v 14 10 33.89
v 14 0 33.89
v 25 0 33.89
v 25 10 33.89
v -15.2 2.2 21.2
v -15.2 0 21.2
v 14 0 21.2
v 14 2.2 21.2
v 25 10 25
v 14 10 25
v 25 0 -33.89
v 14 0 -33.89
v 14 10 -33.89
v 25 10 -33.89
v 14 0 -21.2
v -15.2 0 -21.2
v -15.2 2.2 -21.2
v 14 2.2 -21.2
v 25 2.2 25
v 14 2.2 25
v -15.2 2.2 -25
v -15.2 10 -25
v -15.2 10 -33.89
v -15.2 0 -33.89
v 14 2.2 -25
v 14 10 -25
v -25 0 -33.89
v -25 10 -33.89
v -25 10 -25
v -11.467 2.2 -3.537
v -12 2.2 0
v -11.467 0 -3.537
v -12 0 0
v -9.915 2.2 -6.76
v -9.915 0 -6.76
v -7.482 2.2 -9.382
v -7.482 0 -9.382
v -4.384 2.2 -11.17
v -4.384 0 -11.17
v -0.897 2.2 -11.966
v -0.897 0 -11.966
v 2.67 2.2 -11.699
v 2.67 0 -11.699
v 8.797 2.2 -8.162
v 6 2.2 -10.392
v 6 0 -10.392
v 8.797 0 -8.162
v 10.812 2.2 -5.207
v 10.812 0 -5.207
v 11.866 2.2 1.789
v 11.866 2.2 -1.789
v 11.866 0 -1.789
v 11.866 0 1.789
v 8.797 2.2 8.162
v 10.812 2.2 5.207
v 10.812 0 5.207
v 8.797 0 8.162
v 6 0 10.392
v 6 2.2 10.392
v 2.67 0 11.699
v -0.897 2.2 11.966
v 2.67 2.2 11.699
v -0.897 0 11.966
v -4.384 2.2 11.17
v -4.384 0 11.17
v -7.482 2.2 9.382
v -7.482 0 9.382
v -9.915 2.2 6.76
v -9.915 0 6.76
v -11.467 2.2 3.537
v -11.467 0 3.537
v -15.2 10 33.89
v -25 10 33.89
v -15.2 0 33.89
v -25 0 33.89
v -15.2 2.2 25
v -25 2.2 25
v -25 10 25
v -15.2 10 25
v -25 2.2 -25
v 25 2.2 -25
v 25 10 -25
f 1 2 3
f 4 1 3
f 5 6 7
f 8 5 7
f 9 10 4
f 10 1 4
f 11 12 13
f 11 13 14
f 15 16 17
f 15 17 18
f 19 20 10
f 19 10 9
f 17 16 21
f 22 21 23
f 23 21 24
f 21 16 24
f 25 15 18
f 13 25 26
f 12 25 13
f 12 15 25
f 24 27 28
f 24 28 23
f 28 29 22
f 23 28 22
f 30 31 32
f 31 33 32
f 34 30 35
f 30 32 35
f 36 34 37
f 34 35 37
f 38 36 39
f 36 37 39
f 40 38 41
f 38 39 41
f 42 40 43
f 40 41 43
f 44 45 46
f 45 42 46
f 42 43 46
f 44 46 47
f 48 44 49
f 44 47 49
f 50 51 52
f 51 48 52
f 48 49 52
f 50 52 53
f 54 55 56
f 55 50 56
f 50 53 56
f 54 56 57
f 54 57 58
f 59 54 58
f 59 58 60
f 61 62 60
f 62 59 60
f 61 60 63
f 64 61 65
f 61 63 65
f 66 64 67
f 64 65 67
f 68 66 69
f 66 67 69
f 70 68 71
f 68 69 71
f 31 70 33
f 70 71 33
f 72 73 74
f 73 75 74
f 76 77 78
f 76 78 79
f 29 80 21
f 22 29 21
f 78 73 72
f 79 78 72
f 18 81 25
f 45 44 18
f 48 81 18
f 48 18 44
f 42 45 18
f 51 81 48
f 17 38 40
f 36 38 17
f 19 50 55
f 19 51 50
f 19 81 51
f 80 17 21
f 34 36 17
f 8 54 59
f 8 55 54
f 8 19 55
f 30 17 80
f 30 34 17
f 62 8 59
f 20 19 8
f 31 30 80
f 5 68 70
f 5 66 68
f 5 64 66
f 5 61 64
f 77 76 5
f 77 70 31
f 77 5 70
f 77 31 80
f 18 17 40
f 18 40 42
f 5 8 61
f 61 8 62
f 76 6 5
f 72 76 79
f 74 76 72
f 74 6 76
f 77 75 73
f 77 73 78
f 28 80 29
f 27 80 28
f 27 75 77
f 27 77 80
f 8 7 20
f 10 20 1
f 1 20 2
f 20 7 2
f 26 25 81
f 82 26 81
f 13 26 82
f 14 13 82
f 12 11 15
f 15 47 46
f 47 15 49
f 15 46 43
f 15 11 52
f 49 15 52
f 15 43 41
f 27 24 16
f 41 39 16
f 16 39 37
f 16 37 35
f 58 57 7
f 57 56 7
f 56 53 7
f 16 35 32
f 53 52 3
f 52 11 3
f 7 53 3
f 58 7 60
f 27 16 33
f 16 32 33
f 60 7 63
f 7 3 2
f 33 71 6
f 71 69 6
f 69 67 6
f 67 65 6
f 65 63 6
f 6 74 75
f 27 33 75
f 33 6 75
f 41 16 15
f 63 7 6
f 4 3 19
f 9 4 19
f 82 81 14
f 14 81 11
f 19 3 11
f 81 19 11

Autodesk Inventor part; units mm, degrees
ref_plane "YZ Plane" through (0, 0, 0) normal (1, 0, 0) x (0, 1, 0)
ref_plane "XZ Plane" through (0, 0, 0) normal (0, 1, 0) x (-1, 0, 0)
ref_plane "XY Plane" through (0, 0, 0) normal (0, 0, 1) x (1, 0, 0)
sketch "Sketch1" plane through (0, 0, 0) normal (0, 1, 0) x (-1, 0, 0)
  circle A0 centre (0, 0) radius 12
  line L0 (25, -21.2) -> (-25, -21.2)
  line L1 (25, -21.2) -> (25, 21.2)
  line L2 (25, 21.2) -> (-25, 21.2)
  line L3 (-25, 21.2) -> (-25, -21.2)
  line L4 (25, 21.2) -> (25, 25)
  line L5 (15.2, 21.2) -> (15.2, 25)
  line L6 (25, -21.2) -> (25, -25)
  line L7 (15.2, -21.2) -> (15.2, -25)
  line L8 (25, -25) -> (15.2, -25)
  line L9 (25, 25) -> (15.2, 25)
  line L10 (-25, 21.2) -> (-25, 25)
  line L11 (-14, 21.2) -> (-14, 25)
  line L12 (-25, -21.2) -> (-25, -25)
  line L13 (-14, -21.2) -> (-14, -25)
  line L14 (-14, -25) -> (-25, -25)
  line L15 (-14, 25) -> (-25, 25)
  point P0 (25, 0)
  point P1 (0, -21.2)
  dimension "d0" = 24
  dimension "d4" = 50
  dimension "d5" = 42.4
  dimension "d8" = 9.8
  dimension "d10" = 50
  dimension "d11" = 11
extrude "Extrusion1" add sketch "Sketch1" along normal blind 2.2
sketch "Sketch2" plane through (0, 0, 0) normal (0, -1, 0) x (1, 0, 0)
  line L0 (25, 25) -> (25, -25) construction
  line L1 (-25, 25) -> (-15.2, 25) construction
  line L2 (-15.2, -25) -> (-25, -25) construction
  line L3 (25, -25) -> (14, -25) construction
  line L4 (-25, 25) -> (-15.2, 25)
  line L5 (-25, -25) -> (-15.2, -25)
  line L6 (25, -25) -> (14, -25) construction
  line L7 (14, -25) -> (25, -25)
  line L8 (14, 25) -> (25, 25) construction
  line L9 (14, 25) -> (25, 25)
  line L10 (-25, 25) -> (-25, 33.89)
  line L11 (-25, 33.89) -> (-15.2, 33.89)
  line L12 (-15.2, 33.89) -> (-15.2, 25)
  line L13 (14, 25) -> (14, 33.89)
  line L14 (14, 33.89) -> (25, 33.89)
  line L15 (25, 33.89) -> (25, 25)
  line L16 (-15.2, -25) -> (-25, -25) construction
  line L17 (-25, -25) -> (-25, -33.89)
  line L18 (-25, -33.89) -> (-15.2, -33.89)
  line L19 (-15.2, -33.89) -> (-15.2, -25)
  line L20 (14, -25) -> (14, -33.89)
  line L21 (14, -33.89) -> (25, -33.89)
  line L22 (25, -33.89) -> (25, -25)
  dimension "d12" = 8.89
  dimension "d13" = 8.89
  dimension "d14" = 8.89
  dimension "d15" = 8.89
extrude "Extrusion2" add sketch "Sketch2" against normal blind 10
properties part number "Cover"
